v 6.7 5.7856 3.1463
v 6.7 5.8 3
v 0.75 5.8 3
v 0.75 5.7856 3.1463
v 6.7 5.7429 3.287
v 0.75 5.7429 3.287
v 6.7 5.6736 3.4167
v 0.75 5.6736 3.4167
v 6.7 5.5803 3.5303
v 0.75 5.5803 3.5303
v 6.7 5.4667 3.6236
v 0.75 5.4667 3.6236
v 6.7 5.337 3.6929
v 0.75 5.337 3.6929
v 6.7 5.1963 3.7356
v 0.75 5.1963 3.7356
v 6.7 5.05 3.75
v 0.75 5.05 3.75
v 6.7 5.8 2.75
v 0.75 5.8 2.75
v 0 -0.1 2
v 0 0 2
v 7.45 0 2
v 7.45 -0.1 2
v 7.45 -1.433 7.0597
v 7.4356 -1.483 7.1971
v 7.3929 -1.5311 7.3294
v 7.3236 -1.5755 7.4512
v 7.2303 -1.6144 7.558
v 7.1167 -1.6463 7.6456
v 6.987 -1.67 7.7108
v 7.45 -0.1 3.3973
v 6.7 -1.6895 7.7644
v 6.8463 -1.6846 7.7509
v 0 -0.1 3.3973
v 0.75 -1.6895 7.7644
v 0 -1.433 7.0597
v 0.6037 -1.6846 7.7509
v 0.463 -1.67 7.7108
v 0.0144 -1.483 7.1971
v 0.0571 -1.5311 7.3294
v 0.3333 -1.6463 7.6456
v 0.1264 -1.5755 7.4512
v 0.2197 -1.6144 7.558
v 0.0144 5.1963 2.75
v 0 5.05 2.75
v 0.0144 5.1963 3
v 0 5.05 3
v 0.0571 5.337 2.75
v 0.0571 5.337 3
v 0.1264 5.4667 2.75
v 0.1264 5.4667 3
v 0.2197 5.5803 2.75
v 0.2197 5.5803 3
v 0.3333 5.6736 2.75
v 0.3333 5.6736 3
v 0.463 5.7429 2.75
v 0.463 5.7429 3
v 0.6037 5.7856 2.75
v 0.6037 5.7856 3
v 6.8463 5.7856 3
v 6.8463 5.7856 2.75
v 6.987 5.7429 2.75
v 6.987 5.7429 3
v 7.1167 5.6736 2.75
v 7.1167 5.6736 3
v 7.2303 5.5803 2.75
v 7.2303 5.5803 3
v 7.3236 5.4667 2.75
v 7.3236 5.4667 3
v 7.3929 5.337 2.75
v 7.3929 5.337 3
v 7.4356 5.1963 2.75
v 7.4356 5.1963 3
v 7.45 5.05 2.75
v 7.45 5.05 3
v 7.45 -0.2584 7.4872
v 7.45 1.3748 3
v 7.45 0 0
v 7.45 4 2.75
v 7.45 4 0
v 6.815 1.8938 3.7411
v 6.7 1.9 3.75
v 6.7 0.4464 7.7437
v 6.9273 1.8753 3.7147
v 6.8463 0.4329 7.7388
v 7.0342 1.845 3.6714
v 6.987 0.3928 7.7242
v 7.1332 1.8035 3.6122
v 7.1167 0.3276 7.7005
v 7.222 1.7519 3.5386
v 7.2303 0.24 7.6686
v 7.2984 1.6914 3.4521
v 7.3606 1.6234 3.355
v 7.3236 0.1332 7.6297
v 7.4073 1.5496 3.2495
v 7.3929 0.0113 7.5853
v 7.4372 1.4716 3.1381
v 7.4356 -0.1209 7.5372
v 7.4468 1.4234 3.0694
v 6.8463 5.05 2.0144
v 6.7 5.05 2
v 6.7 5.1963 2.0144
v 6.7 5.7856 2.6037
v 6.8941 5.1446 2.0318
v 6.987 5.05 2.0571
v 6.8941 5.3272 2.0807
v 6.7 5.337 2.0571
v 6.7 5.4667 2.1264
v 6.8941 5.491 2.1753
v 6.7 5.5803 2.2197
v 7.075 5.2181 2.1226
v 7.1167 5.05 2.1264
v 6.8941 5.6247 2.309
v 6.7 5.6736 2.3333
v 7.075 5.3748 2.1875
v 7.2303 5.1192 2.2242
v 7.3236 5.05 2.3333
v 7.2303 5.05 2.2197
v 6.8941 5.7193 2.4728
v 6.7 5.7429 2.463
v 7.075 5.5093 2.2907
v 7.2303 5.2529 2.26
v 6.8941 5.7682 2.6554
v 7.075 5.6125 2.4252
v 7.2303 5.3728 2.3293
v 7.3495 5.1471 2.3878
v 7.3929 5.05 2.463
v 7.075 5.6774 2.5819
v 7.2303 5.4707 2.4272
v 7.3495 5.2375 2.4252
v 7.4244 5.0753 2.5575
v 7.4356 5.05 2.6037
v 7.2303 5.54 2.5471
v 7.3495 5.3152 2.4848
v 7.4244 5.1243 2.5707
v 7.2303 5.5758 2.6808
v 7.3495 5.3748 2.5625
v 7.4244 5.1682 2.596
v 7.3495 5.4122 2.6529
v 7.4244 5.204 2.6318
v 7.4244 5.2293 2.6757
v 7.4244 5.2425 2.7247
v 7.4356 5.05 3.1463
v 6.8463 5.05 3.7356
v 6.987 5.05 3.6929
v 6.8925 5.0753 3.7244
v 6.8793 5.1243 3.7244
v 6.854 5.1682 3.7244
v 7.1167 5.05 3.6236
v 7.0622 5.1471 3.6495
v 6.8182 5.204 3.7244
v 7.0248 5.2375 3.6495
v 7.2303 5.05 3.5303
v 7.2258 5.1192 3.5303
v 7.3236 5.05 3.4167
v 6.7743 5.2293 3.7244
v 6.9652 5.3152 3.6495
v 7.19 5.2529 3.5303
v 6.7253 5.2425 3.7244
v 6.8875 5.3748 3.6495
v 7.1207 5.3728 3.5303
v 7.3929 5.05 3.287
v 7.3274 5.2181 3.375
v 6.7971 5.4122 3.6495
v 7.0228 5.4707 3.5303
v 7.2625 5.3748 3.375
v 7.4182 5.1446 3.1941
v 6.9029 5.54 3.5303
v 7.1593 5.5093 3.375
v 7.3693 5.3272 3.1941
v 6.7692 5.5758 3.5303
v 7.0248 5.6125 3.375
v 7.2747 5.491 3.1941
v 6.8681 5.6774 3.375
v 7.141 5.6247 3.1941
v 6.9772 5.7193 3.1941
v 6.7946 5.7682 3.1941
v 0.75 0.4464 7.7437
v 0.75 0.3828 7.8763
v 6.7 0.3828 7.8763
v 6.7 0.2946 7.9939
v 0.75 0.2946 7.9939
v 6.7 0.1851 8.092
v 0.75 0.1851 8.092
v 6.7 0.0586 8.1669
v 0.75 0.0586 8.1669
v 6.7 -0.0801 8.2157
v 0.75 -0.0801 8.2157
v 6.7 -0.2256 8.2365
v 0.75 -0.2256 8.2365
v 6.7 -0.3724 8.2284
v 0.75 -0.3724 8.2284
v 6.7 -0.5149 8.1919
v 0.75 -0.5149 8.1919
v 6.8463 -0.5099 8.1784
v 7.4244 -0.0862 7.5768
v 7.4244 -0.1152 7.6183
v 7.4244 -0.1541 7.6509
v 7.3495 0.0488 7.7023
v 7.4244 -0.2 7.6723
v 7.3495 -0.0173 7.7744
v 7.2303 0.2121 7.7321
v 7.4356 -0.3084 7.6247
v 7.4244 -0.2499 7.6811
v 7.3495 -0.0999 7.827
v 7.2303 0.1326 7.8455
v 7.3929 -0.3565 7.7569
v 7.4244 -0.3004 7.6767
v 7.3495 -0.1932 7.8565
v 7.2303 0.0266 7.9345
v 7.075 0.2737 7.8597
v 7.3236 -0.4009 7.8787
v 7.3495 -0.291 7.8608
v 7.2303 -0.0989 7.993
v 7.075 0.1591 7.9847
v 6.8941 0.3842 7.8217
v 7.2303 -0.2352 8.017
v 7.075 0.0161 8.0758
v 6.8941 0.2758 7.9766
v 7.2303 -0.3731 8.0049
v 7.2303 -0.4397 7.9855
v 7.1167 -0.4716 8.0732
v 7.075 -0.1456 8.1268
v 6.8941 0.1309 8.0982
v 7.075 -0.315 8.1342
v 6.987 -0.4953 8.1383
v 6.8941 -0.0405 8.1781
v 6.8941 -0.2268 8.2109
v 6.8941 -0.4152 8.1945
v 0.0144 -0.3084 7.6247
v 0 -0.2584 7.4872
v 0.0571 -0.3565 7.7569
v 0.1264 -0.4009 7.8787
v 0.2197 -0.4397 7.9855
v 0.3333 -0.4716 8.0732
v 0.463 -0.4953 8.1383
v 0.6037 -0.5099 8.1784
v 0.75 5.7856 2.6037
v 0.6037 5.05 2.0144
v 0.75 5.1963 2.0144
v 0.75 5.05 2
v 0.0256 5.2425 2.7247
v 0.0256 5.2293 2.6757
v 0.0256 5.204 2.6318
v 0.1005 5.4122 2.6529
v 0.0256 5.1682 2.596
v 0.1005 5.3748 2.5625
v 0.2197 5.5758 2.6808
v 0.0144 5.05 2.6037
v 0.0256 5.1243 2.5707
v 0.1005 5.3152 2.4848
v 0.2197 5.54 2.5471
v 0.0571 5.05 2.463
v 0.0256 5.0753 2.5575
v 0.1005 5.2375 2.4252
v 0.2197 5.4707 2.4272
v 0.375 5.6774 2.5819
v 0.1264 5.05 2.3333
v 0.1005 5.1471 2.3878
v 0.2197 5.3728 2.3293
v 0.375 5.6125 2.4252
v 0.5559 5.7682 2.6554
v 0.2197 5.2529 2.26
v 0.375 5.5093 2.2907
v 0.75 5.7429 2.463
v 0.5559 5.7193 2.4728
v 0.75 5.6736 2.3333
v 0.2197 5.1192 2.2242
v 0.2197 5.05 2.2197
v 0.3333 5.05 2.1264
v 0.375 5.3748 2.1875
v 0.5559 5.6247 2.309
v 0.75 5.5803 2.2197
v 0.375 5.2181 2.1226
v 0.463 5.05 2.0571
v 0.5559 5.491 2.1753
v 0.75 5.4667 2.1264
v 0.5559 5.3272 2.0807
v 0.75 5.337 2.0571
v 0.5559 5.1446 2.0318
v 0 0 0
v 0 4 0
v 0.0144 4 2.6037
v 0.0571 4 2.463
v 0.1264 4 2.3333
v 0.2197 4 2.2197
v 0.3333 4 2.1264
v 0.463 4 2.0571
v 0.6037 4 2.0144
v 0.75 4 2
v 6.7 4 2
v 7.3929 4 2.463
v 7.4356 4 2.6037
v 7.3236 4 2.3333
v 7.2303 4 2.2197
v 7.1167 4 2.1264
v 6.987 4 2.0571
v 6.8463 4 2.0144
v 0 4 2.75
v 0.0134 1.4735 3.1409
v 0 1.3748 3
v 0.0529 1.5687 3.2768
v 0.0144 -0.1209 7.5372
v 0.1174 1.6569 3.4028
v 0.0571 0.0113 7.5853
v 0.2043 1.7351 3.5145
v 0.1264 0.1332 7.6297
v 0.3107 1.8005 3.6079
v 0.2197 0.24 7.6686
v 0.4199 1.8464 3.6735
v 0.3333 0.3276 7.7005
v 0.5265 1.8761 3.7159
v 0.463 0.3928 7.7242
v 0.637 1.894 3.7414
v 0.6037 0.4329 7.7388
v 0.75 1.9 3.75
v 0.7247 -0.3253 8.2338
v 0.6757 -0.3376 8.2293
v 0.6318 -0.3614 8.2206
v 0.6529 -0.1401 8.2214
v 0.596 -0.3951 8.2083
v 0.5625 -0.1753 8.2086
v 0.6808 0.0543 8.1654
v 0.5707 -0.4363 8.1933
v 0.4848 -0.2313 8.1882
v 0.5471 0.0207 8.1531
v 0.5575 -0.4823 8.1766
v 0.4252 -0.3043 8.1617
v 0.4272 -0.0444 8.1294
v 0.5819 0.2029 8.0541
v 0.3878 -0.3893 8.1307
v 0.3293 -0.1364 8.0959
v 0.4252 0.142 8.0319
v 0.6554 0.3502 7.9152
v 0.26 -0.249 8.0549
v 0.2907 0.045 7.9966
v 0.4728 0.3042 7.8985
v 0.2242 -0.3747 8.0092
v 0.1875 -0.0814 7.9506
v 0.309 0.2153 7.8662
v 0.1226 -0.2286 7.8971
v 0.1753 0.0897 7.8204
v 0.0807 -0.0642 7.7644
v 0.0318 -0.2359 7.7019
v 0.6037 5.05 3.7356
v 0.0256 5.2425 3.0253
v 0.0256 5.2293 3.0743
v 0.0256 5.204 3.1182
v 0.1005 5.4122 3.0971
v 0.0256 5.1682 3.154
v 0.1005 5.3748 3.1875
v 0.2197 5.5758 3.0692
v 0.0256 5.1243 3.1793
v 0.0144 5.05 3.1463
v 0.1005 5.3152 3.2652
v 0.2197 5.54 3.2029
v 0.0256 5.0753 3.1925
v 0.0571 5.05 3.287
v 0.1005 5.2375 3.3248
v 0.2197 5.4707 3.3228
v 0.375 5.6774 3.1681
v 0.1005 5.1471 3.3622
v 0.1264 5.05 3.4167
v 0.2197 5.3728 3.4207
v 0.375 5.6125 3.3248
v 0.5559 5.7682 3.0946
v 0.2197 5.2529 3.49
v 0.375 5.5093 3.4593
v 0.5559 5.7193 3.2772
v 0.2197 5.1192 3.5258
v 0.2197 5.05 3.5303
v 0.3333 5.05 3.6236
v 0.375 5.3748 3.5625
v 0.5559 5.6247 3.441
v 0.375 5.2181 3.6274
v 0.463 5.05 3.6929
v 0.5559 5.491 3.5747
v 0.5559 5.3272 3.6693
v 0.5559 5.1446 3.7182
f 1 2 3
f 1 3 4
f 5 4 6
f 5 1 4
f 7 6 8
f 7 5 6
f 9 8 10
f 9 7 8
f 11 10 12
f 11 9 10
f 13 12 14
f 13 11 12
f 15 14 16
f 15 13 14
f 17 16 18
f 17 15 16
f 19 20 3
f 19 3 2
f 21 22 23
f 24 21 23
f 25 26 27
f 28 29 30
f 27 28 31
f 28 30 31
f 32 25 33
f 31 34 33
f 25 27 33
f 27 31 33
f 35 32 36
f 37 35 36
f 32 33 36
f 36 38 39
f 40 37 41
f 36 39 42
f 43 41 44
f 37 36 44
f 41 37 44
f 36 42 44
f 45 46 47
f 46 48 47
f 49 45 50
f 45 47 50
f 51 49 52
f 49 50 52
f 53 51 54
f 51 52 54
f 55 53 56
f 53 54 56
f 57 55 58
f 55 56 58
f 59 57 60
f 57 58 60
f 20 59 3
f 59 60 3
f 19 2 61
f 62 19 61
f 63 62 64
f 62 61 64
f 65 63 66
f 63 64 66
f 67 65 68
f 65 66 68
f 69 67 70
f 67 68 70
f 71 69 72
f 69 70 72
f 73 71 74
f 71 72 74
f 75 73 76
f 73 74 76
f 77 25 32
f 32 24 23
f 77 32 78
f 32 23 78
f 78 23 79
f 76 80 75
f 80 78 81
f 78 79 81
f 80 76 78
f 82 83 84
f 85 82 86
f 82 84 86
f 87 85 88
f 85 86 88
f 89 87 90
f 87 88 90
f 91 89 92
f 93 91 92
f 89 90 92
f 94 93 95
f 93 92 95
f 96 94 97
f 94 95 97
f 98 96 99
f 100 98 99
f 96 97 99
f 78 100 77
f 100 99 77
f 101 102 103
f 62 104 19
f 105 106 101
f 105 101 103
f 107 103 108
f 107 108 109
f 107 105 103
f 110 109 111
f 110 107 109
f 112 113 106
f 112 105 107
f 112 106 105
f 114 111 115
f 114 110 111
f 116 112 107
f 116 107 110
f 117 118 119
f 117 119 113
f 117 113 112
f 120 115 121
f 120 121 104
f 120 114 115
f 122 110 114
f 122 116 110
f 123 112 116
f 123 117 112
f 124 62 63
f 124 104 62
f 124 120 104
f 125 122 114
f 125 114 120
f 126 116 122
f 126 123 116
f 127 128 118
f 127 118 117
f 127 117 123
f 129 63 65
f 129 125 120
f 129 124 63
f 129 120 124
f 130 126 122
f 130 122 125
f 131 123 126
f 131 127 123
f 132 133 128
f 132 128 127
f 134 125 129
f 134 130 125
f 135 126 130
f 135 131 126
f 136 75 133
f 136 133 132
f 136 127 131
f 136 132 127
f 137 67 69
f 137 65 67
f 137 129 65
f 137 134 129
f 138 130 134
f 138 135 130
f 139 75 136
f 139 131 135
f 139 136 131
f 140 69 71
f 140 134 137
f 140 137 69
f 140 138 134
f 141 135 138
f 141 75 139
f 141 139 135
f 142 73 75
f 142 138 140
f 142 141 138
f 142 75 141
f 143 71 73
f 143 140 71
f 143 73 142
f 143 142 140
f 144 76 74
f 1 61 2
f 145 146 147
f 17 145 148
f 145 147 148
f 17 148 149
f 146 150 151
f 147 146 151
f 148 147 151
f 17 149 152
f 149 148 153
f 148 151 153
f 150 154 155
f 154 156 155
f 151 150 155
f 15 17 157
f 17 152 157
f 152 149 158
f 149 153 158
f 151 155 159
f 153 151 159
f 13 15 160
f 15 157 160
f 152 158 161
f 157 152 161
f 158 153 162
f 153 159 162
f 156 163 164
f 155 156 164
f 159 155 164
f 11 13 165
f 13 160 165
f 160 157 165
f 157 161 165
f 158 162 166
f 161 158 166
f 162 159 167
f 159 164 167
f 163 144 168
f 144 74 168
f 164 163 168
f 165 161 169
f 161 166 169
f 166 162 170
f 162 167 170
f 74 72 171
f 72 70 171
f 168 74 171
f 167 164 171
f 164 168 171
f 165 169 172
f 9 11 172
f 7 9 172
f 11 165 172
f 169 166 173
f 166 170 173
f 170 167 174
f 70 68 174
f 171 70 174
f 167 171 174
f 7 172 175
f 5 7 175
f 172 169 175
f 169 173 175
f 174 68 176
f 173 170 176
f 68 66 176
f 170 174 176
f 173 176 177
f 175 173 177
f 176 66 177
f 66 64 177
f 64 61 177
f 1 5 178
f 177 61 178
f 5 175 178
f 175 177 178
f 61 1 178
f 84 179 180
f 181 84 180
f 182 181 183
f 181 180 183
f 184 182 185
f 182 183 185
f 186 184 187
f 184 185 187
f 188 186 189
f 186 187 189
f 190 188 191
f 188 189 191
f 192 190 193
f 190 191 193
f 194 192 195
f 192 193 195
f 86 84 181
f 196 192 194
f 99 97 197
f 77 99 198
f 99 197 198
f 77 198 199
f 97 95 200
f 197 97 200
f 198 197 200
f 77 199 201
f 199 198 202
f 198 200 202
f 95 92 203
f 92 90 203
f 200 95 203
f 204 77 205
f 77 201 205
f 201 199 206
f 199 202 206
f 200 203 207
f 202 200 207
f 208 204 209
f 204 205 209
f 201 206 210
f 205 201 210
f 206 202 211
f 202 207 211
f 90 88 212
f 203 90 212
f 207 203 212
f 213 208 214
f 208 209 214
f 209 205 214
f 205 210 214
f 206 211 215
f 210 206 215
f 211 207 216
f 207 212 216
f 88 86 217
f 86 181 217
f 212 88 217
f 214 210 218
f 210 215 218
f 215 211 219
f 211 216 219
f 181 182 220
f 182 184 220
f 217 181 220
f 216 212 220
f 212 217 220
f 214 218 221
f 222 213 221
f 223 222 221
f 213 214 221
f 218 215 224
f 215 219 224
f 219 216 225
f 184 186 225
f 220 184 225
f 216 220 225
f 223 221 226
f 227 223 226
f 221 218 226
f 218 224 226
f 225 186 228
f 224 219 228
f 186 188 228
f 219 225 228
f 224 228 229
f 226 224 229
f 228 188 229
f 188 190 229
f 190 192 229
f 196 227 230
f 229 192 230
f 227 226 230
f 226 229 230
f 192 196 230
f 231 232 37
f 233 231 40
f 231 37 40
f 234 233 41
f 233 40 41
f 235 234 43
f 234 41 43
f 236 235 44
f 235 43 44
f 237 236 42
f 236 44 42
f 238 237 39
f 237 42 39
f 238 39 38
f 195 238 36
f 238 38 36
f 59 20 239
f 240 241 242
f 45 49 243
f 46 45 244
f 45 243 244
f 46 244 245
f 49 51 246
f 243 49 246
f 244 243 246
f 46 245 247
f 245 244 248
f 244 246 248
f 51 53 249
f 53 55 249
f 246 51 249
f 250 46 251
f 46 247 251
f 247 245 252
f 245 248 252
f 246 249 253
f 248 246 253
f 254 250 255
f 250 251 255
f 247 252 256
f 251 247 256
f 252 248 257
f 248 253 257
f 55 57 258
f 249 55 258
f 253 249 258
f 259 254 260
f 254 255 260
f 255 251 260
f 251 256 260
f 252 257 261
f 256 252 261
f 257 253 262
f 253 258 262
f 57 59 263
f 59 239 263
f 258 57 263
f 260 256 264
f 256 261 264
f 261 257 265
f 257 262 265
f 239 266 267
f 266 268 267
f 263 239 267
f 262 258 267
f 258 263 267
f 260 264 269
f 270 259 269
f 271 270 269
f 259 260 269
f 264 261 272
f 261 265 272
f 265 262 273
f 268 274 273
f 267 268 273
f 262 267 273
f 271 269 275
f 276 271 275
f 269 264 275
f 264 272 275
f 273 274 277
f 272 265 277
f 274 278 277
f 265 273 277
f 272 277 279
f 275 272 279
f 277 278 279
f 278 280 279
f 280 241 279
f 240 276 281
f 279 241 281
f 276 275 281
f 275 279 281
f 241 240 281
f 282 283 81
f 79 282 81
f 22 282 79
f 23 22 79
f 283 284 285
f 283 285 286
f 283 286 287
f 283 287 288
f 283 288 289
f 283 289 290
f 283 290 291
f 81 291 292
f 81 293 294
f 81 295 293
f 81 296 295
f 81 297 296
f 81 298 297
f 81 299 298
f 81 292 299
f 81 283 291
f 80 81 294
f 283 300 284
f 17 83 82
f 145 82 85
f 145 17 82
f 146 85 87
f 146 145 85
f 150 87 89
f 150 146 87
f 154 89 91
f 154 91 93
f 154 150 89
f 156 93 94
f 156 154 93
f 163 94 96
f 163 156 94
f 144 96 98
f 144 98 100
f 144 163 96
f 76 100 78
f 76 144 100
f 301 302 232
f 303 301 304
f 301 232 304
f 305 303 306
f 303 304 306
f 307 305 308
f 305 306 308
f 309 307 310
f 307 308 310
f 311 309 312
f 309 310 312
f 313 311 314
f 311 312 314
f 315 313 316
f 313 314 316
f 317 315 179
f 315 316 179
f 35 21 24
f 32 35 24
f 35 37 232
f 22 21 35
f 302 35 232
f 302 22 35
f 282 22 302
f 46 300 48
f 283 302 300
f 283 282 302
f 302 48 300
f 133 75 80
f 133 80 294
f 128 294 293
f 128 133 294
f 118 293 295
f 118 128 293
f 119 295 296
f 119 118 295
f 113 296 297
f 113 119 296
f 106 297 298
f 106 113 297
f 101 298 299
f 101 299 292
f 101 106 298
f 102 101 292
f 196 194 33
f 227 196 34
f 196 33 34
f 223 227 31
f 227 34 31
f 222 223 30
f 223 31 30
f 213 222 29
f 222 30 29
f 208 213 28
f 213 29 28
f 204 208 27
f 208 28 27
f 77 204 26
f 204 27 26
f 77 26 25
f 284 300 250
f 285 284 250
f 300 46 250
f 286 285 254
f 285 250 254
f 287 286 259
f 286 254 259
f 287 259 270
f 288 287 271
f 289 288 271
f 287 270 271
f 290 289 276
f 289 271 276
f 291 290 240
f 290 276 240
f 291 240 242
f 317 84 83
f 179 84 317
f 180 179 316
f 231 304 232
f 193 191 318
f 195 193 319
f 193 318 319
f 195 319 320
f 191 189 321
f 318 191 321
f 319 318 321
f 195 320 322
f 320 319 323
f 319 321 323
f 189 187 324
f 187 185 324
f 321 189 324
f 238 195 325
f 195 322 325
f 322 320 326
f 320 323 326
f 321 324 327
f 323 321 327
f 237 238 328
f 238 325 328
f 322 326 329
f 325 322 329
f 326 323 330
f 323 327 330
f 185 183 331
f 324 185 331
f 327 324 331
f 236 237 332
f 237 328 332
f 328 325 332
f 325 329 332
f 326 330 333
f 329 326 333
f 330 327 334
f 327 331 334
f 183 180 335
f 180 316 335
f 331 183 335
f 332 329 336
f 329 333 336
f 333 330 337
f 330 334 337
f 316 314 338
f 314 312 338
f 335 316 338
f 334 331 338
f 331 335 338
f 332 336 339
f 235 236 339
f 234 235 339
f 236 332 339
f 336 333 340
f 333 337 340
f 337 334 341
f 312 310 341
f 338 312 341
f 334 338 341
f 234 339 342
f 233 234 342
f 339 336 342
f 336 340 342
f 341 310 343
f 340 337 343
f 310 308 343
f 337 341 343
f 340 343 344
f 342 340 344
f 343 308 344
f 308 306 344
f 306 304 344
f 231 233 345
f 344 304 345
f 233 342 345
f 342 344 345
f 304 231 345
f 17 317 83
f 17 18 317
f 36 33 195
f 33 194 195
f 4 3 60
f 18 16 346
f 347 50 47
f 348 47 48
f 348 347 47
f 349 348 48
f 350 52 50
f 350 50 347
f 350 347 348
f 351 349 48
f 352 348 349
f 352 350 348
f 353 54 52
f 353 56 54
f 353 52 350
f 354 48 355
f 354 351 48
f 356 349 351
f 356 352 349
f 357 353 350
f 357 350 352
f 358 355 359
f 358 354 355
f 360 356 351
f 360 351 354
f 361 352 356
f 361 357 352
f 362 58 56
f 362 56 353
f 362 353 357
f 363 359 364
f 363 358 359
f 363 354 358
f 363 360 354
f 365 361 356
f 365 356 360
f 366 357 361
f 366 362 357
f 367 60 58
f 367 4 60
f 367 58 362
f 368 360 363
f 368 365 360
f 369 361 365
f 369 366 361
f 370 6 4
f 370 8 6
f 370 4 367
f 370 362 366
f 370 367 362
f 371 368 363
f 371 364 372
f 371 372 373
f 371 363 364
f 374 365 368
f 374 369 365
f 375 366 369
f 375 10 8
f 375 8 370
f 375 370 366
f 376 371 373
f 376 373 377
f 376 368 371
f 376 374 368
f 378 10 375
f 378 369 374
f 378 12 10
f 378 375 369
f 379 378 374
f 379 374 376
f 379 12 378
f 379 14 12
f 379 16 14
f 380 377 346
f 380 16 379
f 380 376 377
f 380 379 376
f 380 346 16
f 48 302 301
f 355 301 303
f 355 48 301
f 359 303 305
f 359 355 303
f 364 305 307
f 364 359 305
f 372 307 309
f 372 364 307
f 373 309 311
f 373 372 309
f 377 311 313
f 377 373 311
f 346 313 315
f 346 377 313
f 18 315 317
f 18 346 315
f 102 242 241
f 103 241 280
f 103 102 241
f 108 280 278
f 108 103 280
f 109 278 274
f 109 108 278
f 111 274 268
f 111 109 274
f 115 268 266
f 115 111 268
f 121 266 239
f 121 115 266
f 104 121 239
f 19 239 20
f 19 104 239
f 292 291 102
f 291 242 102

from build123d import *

# Parameters (mm, degrees)
F0_W        = 7.45
F0_H        = 4
F1_DEPTH    = 2
F2_W        = 7.45
F2_H        = 5.9
F3_DEPTH    = 1.75
F6_W        = 7.45
F6_H        = 5
F7_DEPTH    = 2
F8_R        = 0.75
F9_T1_DEPTH = 1.05
F9_S5_W     = 0.75
F9_S5_H     = 0.75
F9_T6_DEPTH = 0.75


# Not quite as in the source:
# - a fillet or chamfer that OpenCascade refuses, or shapes differently, is made with other operations: its cross-section is extruded or revolved along the edge and cut away or added


with BuildPart() as f1:
    # F0 (on Top) → F1 (new body)
    with BuildSketch(Plane.XY):
        with Locations((3.725, 2)):
            Rectangle(F0_W, F0_H)
    extrude(amount=F1_DEPTH)

    # F2 (on face) → F3 (join)
    with BuildSketch(Plane.XY.offset(2)):
        with Locations((3.725, 2.85)):
            Rectangle(F2_W, F2_H)
    extrude(amount=F3_DEPTH)

    # F6 (on line) → F7 (join)
    with BuildSketch(Plane(origin=(0, 2.8829689891, 1.0493148984), x_dir=(-1, 0, 0), z_dir=(0, 0.9396926208, 0.3420201433))):
        with Locations((-3.725, 5.3740090556)):
            Rectangle(F6_W, F6_H)
    extrude(amount=-F7_DEPTH)

    # F8
    f8_edges = [f1.edges().sort_by_distance(p)[0] for p in [
        (7.45, 5.8, 2.875),
        (7.45, 3.85, 3.75),
        (3.725, 5.8, 3.75),
        (3.725, 5.8, 2),
        (0, 5.8, 2.875),
        (0, 3.85, 3.75),
        (0, 4.9, 2),
        (0, 1.04495, 6.099232),
        (3.725, 0.189899, 8.448463),
        (7.45, 1.04495, 6.099232),
        (7.45, -0.749793, 8.106443),
        (0, -0.749793, 8.106443),
    ]]
    fillet(f8_edges, radius=F8_R)

    # F9: fillet of radius 0.75 on 1 edges, made by hand

    # F9_s2 → F9_t1 (cut)
    with BuildSketch(Plane.XZ.offset(-5.05)):
        with BuildLine():
            ThreePointArc((7.45, 2.75), (7.2303300859, 2.2196699141), (6.7, 2))
            Line((6.7, 2), (7.45, 2))
            Line((7.45, 2), (7.45, 2.75))
        make_face()
    extrude(amount=F9_T1_DEPTH, mode=Mode.SUBTRACT)


with BuildPart() as f9_tool4:
    # F9_s5 → F9_t6 (new body)
    with BuildSketch(Plane.YZ.offset(6.7)):
        with Locations((5.425, 2.375)):
            Rectangle(F9_S5_W, F9_S5_H)
    extrude(amount=F9_T6_DEPTH)

    # F9_s7 → F9_t8 (revolve, cut)
    with BuildSketch(Plane(origin=(6.7, 5.05, 2.75), x_dir=(0, -0.7071067812, 0.7071067812), z_dir=(0, 0.7071067812, 0.7071067812))):
        with BuildLine():
            ThreePointArc((0, -0.75), (0.75, 0), (0, 0.75))
            Line((0, 0.75), (0, -0.75))
        make_face()
    revolve(axis=Axis((6.7, 5.05, 2.75), (1, 0, 0)), mode=Mode.SUBTRACT)


with BuildPart() as f1_1:
    add(f1.part)

    # F9_t3: cut F9_tool4
    add(f9_tool4.part, mode=Mode.SUBTRACT)


solid = f1_1.part
